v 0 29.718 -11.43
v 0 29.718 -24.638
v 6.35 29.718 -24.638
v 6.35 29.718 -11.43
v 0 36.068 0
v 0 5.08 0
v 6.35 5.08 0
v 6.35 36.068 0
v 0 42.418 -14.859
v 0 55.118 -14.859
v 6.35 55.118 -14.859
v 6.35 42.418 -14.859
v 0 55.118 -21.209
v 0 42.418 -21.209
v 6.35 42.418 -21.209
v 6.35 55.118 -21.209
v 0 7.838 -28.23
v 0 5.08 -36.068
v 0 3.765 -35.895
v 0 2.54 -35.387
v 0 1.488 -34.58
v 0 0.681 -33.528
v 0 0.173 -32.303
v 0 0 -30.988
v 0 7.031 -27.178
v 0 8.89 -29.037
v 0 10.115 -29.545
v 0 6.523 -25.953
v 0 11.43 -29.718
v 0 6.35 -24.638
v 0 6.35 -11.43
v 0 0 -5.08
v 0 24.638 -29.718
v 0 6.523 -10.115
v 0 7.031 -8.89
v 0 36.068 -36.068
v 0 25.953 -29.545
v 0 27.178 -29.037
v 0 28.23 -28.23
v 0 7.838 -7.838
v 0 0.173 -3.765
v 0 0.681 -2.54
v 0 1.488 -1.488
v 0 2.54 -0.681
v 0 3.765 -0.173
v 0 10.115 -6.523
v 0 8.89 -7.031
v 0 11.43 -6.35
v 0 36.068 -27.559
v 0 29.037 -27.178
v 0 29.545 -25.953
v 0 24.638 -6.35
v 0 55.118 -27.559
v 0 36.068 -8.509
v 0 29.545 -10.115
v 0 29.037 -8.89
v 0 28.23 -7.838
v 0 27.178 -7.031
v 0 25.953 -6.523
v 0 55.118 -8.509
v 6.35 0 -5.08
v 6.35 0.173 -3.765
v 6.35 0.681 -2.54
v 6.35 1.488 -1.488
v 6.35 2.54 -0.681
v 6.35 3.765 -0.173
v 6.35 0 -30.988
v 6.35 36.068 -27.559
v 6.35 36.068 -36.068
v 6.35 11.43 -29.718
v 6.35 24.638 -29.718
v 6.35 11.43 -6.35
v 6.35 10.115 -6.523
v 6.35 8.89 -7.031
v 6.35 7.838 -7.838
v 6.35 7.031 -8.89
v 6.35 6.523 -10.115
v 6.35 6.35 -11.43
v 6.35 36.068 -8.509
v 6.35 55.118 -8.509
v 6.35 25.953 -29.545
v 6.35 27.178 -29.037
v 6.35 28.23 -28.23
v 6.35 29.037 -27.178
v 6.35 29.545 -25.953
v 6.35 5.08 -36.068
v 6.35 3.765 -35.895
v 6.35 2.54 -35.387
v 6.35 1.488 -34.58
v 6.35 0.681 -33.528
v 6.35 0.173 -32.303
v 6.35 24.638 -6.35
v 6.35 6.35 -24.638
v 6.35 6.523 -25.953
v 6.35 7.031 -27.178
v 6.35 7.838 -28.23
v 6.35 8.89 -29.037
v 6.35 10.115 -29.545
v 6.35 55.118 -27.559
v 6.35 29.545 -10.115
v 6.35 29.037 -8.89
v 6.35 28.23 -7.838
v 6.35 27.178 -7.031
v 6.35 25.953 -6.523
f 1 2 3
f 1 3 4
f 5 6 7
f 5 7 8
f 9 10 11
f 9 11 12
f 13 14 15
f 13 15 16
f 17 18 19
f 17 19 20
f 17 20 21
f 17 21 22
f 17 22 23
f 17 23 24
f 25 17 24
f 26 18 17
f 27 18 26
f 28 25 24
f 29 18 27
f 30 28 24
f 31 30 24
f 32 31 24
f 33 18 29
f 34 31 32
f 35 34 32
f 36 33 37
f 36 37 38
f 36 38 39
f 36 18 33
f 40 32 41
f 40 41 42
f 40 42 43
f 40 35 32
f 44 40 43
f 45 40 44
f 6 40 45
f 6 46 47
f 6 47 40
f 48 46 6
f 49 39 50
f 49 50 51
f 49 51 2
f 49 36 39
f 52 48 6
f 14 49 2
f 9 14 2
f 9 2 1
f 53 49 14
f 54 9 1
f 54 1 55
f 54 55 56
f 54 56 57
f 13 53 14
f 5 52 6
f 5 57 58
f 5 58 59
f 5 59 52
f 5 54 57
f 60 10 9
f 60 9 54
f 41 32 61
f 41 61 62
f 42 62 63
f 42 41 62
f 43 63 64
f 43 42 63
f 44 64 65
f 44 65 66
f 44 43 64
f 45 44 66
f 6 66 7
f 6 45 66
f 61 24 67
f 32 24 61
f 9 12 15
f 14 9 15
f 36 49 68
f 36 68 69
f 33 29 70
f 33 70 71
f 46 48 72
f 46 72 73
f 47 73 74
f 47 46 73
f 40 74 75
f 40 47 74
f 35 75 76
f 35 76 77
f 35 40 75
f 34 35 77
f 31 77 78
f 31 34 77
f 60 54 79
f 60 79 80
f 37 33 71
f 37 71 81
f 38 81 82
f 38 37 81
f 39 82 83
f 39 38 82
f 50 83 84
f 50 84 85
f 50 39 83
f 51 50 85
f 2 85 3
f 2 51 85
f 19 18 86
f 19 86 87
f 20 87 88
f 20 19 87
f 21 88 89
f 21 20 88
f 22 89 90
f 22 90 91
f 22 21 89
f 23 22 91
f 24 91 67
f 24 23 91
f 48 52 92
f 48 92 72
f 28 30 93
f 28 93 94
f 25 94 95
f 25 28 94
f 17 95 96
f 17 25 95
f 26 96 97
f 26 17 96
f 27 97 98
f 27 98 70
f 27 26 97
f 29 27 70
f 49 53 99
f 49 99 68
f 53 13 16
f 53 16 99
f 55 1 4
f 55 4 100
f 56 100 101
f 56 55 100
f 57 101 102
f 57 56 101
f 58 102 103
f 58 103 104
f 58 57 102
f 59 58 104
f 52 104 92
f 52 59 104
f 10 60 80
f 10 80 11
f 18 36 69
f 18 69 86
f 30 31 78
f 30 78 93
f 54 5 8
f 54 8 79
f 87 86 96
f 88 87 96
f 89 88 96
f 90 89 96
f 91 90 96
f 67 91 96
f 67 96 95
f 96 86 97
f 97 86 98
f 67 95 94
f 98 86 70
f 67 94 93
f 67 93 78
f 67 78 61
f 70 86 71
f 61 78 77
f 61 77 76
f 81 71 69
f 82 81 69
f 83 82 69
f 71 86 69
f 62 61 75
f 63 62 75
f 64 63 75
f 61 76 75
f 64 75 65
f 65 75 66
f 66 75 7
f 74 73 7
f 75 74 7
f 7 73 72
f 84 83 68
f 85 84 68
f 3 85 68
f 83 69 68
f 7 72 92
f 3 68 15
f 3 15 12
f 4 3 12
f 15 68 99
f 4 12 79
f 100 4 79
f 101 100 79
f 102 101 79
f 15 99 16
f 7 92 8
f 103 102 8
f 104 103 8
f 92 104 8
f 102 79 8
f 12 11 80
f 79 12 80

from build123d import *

# Parameters (mm, degrees)
BOSS_EXTRUDE1_DEPTH = 6.35


with BuildPart() as part:
    # Sketch2 → Boss-Extrude1 (new body)
    with BuildSketch(Plane(origin=(0, 0, 0), x_dir=(0, 0, -1), z_dir=(1, 0, 0))):
        with BuildLine():
            Line((14.859, 55.118), (14.859, 42.418))
            Line((14.859, 42.418), (21.209, 42.418))
            Line((21.209, 42.418), (21.209, 55.118))
            Line((21.209, 55.118), (27.559, 55.118))
            Line((27.559, 55.118), (27.559, 36.068))
            Line((27.559, 36.068), (36.068, 36.068))
            Line((36.068, 36.068), (36.068, 5.08))
            ThreePointArc((36.068, 5.08), (34.580102448, 1.487897552), (30.988, 0))
            Line((30.988, 0), (5.08, 0))
            ThreePointArc((5.08, 0), (1.487897552, 1.487897552), (0, 5.08))
            Line((0, 5.08), (0, 36.068))
            Line((0, 36.068), (8.509, 36.068))
            Line((8.509, 36.068), (8.509, 55.118))
            Line((8.509, 55.118), (14.859, 55.118))
        make_face()
        with BuildLine():
            Line((11.43, 6.35), (24.638, 6.35))
            ThreePointArc((24.638, 6.35), (28.230102448, 7.837897552), (29.718, 11.43))
            Line((29.718, 11.43), (29.718, 24.638))
            ThreePointArc((29.718, 24.638), (28.230102448, 28.230102448), (24.638, 29.718))
            Line((24.638, 29.718), (11.43, 29.718))
            ThreePointArc((11.43, 29.718), (7.837897552, 28.230102448), (6.35, 24.638))
            Line((6.35, 24.638), (6.35, 11.43))
            ThreePointArc((6.35, 11.43), (7.837897552, 7.837897552), (11.43, 6.35))
        make_face(mode=Mode.SUBTRACT)
    extrude(amount=BOSS_EXTRUDE1_DEPTH)


solid = part.part
